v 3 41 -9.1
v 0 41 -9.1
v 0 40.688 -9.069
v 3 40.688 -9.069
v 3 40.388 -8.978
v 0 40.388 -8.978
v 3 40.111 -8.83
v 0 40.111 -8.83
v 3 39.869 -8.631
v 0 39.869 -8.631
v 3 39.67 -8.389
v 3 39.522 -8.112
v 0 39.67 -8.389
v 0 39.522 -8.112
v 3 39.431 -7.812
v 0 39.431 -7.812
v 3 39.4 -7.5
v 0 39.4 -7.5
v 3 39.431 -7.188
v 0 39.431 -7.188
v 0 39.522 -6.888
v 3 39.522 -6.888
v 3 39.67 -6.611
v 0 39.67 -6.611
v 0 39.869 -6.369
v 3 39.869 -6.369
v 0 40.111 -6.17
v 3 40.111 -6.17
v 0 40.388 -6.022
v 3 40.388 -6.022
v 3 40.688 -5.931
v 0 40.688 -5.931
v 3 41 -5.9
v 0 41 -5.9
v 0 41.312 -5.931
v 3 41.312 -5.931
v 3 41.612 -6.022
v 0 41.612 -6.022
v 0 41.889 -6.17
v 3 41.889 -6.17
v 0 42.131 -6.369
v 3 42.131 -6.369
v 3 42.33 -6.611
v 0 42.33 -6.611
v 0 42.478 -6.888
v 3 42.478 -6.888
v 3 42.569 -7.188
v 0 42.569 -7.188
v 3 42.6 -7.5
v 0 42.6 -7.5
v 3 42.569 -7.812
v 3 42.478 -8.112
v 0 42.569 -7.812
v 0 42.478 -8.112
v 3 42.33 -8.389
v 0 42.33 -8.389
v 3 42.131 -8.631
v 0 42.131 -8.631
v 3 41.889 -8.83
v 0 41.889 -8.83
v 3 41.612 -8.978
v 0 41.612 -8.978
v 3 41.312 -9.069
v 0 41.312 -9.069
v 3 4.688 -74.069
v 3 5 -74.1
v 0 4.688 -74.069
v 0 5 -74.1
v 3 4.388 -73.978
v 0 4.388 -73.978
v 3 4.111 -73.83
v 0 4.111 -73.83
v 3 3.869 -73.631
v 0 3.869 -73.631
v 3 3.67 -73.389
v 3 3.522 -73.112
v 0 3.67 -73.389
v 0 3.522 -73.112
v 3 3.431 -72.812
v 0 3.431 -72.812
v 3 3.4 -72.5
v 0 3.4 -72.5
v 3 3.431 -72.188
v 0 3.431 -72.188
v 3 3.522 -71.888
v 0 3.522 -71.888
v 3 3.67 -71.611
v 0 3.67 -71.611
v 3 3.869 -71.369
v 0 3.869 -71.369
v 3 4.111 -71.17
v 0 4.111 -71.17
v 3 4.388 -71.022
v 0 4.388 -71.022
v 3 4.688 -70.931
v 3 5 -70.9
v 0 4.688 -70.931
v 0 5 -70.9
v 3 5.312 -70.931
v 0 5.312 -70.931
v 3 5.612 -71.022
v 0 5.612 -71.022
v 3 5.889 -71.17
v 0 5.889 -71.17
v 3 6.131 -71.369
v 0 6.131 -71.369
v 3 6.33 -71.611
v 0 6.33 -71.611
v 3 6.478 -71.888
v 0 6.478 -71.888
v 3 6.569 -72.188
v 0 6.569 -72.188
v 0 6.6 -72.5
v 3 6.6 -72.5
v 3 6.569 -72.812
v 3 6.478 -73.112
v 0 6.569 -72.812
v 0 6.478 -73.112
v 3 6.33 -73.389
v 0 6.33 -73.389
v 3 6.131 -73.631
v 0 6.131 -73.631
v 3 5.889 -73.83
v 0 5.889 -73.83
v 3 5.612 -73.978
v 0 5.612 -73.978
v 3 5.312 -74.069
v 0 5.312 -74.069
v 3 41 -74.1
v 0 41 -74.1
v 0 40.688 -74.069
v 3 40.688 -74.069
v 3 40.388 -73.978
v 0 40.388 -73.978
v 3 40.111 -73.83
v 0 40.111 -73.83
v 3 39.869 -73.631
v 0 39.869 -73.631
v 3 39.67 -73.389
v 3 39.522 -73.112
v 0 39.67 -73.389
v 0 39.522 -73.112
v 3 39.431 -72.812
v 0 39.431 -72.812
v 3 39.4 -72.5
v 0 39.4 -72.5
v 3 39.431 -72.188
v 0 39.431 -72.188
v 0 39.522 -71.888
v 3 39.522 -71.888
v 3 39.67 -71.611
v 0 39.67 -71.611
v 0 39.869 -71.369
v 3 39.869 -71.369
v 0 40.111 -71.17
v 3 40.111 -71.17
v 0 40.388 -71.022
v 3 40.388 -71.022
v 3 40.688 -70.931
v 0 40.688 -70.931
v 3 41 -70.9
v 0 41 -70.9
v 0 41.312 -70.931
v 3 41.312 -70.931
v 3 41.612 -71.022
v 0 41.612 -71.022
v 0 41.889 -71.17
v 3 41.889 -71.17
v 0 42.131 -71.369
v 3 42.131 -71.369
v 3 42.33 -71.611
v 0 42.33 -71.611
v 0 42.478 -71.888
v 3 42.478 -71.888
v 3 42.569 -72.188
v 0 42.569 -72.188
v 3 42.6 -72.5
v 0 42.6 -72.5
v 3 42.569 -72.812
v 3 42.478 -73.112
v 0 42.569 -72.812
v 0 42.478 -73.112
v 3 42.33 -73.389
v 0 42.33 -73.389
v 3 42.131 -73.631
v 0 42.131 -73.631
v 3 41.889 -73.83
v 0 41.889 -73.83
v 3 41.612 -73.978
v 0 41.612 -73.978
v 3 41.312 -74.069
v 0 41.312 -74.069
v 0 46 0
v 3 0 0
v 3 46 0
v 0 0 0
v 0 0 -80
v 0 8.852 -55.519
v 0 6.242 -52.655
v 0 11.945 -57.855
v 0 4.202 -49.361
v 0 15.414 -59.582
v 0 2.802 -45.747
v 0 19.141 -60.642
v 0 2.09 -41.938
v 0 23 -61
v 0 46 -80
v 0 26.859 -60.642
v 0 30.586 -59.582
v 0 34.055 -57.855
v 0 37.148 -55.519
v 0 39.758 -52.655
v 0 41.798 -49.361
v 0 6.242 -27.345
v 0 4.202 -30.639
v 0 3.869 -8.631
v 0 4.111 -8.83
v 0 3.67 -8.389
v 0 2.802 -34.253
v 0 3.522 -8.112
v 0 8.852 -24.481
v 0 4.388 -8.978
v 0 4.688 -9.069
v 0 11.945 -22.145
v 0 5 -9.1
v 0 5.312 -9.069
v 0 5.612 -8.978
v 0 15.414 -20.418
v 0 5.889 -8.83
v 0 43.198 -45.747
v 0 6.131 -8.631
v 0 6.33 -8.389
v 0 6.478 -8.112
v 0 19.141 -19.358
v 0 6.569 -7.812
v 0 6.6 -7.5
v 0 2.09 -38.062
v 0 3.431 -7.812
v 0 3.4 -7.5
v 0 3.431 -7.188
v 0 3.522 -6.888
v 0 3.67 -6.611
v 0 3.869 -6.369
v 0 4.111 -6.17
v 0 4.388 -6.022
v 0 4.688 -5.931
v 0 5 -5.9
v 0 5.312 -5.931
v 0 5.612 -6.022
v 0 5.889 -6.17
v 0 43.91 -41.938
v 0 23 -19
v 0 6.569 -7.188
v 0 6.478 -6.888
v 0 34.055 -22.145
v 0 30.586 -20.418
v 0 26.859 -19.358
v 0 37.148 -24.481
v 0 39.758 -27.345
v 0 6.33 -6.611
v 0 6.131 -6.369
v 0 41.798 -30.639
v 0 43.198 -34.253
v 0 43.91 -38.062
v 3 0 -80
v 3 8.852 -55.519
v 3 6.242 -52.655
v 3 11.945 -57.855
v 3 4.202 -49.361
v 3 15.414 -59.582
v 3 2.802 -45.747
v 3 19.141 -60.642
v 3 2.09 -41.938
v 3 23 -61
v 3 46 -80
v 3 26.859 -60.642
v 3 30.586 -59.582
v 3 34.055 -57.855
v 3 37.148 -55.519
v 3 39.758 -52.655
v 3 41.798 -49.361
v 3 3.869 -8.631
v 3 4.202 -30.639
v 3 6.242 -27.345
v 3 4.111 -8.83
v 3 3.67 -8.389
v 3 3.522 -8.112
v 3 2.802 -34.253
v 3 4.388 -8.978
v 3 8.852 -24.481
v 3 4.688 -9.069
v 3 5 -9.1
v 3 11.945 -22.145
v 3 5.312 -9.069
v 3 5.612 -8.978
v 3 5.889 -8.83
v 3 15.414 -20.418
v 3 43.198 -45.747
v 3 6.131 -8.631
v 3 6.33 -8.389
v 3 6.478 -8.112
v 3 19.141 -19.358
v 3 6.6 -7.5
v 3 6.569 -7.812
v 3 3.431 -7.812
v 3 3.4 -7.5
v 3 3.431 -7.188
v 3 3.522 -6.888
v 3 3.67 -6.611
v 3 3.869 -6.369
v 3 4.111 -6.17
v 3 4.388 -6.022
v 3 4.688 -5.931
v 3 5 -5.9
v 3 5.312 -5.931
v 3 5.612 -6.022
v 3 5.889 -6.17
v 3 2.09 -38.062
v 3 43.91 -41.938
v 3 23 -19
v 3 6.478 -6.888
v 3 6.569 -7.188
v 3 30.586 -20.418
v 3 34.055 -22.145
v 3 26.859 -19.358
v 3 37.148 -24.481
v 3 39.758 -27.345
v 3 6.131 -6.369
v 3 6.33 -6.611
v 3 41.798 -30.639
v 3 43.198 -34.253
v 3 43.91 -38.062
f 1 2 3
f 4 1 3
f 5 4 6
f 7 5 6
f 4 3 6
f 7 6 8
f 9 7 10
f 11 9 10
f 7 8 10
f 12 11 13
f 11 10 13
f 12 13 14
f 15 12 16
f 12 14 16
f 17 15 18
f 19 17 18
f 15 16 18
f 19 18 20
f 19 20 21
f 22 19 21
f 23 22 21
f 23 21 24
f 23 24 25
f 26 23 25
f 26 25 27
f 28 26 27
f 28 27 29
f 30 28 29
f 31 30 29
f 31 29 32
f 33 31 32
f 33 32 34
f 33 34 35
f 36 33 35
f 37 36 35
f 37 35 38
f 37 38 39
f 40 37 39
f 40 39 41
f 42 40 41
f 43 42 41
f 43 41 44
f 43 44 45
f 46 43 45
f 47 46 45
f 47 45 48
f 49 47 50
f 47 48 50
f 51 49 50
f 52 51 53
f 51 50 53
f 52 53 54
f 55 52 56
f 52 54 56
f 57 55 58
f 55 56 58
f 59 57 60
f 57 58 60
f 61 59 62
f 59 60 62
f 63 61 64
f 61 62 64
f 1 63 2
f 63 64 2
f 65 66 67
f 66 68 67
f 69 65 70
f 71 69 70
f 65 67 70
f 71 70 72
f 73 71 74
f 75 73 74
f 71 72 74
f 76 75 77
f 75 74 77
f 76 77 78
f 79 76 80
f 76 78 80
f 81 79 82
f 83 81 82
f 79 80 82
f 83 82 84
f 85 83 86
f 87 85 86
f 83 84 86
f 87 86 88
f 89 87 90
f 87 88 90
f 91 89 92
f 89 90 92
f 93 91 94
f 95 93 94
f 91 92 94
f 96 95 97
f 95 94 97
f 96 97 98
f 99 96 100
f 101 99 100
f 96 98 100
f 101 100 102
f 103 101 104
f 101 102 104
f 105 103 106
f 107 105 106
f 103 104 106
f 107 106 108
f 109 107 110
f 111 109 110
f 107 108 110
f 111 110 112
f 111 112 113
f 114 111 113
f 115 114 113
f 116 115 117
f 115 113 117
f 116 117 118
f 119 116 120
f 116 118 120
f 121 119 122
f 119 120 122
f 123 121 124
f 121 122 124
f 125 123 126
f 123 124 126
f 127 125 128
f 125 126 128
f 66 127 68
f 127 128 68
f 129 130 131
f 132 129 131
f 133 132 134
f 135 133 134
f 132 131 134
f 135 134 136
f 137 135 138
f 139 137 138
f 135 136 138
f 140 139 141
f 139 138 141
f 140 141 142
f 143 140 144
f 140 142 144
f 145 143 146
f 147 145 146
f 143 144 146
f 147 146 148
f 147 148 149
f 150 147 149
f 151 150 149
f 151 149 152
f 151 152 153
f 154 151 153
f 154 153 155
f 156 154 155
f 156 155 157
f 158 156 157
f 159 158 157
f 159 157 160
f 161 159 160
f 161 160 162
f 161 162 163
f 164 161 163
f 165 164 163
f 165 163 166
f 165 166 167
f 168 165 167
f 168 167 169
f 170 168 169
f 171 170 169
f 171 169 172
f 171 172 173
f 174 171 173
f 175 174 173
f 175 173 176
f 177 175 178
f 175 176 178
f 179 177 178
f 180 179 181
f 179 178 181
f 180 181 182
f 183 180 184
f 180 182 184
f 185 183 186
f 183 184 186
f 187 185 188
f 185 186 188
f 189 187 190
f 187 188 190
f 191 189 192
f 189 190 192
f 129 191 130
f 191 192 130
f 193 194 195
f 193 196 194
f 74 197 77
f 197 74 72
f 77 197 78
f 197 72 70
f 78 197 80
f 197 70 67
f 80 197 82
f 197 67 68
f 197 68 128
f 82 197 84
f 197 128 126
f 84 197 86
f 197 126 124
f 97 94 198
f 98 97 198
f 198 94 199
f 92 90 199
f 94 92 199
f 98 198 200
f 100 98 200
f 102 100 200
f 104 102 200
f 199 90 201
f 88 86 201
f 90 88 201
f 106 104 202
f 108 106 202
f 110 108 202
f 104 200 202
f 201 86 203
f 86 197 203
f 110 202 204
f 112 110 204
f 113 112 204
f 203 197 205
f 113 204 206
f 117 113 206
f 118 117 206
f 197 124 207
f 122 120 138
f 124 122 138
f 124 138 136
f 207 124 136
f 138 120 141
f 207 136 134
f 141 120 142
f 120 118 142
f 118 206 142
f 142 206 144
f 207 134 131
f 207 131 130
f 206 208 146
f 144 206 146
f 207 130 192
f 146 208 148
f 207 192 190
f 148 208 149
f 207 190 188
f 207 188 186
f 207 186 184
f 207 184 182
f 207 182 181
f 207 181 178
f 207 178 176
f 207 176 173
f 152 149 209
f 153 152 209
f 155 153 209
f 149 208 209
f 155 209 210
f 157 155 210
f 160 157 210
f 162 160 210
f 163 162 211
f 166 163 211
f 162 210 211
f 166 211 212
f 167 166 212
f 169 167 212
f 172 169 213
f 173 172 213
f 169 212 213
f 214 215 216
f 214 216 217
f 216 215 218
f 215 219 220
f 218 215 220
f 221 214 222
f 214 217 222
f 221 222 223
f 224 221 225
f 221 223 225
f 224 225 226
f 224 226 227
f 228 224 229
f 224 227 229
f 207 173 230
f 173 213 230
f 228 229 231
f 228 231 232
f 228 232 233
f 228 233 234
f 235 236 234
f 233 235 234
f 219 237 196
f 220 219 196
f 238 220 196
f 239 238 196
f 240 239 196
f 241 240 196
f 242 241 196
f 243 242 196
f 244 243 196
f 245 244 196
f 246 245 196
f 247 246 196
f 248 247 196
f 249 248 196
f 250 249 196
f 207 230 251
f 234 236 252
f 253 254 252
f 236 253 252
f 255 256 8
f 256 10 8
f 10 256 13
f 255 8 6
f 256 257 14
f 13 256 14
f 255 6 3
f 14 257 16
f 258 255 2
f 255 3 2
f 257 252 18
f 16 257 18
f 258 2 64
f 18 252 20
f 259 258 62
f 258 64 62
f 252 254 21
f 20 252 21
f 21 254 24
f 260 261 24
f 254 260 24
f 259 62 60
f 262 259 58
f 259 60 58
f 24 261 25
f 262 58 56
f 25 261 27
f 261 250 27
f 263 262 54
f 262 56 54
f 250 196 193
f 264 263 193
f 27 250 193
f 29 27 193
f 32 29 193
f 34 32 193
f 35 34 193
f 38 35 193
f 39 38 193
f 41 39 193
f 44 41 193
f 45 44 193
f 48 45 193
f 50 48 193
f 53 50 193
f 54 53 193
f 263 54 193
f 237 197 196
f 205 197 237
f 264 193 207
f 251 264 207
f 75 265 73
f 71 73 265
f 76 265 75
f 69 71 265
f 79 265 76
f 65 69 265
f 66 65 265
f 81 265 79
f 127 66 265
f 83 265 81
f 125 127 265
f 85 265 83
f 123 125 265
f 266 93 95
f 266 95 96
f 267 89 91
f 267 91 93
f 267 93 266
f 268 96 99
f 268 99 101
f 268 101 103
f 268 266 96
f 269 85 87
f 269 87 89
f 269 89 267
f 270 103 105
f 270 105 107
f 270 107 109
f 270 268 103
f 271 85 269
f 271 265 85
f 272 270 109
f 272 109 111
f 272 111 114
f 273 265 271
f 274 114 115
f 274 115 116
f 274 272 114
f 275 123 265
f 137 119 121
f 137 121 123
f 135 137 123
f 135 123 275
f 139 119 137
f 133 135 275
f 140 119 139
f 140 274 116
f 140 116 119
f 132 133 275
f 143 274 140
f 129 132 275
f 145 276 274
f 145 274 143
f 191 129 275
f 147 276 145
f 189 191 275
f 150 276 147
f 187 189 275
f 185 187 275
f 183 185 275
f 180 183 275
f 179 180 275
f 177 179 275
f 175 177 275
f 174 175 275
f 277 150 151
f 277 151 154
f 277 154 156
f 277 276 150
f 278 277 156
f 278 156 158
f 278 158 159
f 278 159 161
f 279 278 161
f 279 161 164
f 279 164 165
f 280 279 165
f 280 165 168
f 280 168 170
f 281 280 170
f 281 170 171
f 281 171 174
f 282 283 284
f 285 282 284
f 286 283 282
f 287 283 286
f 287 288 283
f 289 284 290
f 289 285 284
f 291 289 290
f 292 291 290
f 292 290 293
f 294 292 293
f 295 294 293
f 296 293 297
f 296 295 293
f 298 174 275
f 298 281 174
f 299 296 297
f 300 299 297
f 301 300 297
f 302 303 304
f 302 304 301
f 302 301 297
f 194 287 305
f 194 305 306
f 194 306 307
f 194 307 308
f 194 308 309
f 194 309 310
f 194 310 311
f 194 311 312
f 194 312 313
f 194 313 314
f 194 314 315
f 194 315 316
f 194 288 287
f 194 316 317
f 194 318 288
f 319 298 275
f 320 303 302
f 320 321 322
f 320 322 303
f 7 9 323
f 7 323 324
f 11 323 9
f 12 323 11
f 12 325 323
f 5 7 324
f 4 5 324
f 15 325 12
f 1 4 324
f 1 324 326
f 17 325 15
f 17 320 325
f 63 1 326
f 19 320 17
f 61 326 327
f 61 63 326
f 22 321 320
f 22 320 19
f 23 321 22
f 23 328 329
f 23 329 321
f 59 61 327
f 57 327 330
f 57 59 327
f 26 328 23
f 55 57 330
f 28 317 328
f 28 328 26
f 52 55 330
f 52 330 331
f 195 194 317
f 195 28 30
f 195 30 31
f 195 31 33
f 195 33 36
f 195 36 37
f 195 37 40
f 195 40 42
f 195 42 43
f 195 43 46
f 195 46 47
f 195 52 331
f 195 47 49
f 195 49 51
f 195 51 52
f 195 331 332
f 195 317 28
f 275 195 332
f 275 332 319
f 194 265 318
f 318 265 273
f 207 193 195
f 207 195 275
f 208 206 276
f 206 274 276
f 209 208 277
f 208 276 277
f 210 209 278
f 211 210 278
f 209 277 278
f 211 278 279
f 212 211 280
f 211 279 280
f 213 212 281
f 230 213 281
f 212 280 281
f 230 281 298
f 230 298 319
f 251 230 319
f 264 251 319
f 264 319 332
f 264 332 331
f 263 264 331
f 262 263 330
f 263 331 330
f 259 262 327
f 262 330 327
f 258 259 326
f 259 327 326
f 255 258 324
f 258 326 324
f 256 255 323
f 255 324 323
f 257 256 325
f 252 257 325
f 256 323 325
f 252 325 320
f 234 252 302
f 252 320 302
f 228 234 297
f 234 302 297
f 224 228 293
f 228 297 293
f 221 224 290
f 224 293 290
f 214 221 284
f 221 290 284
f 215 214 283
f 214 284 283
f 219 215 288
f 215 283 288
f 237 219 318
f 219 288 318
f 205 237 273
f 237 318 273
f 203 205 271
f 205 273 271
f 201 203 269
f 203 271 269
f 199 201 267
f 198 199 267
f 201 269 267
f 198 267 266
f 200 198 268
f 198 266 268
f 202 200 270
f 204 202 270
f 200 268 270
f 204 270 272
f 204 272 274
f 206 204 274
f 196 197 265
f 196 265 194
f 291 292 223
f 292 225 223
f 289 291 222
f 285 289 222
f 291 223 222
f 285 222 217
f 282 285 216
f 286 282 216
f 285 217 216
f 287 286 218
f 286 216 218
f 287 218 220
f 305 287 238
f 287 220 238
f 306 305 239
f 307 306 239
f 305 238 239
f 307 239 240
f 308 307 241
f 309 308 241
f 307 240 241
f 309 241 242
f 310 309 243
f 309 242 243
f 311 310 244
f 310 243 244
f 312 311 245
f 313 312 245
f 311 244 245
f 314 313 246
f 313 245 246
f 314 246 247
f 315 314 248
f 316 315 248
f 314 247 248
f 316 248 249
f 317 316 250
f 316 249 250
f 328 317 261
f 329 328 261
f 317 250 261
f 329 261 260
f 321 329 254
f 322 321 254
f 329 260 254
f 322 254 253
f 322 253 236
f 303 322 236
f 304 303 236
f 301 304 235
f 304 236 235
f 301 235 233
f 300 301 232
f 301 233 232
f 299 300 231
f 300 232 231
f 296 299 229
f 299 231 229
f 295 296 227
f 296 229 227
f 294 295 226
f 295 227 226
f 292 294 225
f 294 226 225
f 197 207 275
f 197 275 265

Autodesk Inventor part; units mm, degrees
ref_plane "YZ Plane" through (0, 0, 0) normal (1, 0, 0) x (0, 1, 0)
ref_plane "XZ Plane" through (0, 0, 0) normal (0, 1, 0) x (-1, 0, 0)
ref_plane "XY Plane" through (0, 0, 0) normal (0, 0, 1) x (1, 0, 0)
sketch "スケッチ1" plane through (0, 0, 0) normal (1, 0, 0) x (0, 1, 0)
  line L0 (0, 0) -> (46, 0)
  line L1 (46, 0) -> (46, -80)
  line L2 (46, -80) -> (0, -80)
  line L3 (0, -80) -> (0, 0)
  dimension "d0" = 46
  dimension "d1" = 80
extrude "押し出し1" add sketch "スケッチ1" along normal blind 3
sketch "スケッチ2" plane through (3, 0, 0) normal (1, 0, 0) x (0, 0, -1)
  circle A0 centre (40, 23) radius 21
  line L0 (80, 46) -> (0, 46) projected
  line L1 (0, 46) -> (0, 0) projected
  dimension "d4" = 42
  dimension "d5" = 23
  dimension "d6" = 40
extrude "押し出し2" cut sketch "スケッチ2" against normal blind 3
sketch "スケッチ3" plane through (3, 0, 0) normal (1, 0, 0) x (0, 0, -1)
  circle A0 centre (72.5, 41) radius 1.6
  line L0 (80, 0) -> (80, 46) projected
  line L1 (80, 46) -> (0, 46) projected
  circle A1 centre (72.5, 5) radius 1.6
  line L2 (0, 0) -> (80, 0) projected
  circle A2 centre (7.5, 41) radius 1.6
  line L3 (0, 46) -> (0, 0) projected
  circle A3 centre (7.5, 5) radius 1.6
  dimension "d9" = 3.2
  dimension "d10" = 7.5
  dimension "d11" = 5
  dimension "d12" = 3.2
  dimension "d13" = 5
  dimension "d14" = 3.2
  dimension "d15" = 5
  dimension "d16" = 7.5
  dimension "d17" = 3.2
  dimension "d18" = 5
  dimension "d19" = 7.5
  dimension "d20" = 7.5
hole "穴1" at (3, 41, -7.5) at (3, 5, -7.5) at (3, 5, -72.5) at (3, 41, -72.5) direction (-1, 0, 0) diameter 3.2 depth 3
equation "\"BendRadius\" = Thickness"
equation "\"BendReliefWidth\" = Thickness"
equation "\"BendReliefDepth\" = 0.5 * Thickness"
equation "\"CornerReliefSize\" = 4 * Thickness"
equation "\"MinimumRemnant\" = 2 * Thickness"
equation "\"TransitionRadius\" = BendRadius"
equation "\"JacobiRadiusSize\" = BendRadius"
equation "\"GapSize\" = Thickness"
equation "\"Thickness\" = 0.5"
properties part number "nhk30"
